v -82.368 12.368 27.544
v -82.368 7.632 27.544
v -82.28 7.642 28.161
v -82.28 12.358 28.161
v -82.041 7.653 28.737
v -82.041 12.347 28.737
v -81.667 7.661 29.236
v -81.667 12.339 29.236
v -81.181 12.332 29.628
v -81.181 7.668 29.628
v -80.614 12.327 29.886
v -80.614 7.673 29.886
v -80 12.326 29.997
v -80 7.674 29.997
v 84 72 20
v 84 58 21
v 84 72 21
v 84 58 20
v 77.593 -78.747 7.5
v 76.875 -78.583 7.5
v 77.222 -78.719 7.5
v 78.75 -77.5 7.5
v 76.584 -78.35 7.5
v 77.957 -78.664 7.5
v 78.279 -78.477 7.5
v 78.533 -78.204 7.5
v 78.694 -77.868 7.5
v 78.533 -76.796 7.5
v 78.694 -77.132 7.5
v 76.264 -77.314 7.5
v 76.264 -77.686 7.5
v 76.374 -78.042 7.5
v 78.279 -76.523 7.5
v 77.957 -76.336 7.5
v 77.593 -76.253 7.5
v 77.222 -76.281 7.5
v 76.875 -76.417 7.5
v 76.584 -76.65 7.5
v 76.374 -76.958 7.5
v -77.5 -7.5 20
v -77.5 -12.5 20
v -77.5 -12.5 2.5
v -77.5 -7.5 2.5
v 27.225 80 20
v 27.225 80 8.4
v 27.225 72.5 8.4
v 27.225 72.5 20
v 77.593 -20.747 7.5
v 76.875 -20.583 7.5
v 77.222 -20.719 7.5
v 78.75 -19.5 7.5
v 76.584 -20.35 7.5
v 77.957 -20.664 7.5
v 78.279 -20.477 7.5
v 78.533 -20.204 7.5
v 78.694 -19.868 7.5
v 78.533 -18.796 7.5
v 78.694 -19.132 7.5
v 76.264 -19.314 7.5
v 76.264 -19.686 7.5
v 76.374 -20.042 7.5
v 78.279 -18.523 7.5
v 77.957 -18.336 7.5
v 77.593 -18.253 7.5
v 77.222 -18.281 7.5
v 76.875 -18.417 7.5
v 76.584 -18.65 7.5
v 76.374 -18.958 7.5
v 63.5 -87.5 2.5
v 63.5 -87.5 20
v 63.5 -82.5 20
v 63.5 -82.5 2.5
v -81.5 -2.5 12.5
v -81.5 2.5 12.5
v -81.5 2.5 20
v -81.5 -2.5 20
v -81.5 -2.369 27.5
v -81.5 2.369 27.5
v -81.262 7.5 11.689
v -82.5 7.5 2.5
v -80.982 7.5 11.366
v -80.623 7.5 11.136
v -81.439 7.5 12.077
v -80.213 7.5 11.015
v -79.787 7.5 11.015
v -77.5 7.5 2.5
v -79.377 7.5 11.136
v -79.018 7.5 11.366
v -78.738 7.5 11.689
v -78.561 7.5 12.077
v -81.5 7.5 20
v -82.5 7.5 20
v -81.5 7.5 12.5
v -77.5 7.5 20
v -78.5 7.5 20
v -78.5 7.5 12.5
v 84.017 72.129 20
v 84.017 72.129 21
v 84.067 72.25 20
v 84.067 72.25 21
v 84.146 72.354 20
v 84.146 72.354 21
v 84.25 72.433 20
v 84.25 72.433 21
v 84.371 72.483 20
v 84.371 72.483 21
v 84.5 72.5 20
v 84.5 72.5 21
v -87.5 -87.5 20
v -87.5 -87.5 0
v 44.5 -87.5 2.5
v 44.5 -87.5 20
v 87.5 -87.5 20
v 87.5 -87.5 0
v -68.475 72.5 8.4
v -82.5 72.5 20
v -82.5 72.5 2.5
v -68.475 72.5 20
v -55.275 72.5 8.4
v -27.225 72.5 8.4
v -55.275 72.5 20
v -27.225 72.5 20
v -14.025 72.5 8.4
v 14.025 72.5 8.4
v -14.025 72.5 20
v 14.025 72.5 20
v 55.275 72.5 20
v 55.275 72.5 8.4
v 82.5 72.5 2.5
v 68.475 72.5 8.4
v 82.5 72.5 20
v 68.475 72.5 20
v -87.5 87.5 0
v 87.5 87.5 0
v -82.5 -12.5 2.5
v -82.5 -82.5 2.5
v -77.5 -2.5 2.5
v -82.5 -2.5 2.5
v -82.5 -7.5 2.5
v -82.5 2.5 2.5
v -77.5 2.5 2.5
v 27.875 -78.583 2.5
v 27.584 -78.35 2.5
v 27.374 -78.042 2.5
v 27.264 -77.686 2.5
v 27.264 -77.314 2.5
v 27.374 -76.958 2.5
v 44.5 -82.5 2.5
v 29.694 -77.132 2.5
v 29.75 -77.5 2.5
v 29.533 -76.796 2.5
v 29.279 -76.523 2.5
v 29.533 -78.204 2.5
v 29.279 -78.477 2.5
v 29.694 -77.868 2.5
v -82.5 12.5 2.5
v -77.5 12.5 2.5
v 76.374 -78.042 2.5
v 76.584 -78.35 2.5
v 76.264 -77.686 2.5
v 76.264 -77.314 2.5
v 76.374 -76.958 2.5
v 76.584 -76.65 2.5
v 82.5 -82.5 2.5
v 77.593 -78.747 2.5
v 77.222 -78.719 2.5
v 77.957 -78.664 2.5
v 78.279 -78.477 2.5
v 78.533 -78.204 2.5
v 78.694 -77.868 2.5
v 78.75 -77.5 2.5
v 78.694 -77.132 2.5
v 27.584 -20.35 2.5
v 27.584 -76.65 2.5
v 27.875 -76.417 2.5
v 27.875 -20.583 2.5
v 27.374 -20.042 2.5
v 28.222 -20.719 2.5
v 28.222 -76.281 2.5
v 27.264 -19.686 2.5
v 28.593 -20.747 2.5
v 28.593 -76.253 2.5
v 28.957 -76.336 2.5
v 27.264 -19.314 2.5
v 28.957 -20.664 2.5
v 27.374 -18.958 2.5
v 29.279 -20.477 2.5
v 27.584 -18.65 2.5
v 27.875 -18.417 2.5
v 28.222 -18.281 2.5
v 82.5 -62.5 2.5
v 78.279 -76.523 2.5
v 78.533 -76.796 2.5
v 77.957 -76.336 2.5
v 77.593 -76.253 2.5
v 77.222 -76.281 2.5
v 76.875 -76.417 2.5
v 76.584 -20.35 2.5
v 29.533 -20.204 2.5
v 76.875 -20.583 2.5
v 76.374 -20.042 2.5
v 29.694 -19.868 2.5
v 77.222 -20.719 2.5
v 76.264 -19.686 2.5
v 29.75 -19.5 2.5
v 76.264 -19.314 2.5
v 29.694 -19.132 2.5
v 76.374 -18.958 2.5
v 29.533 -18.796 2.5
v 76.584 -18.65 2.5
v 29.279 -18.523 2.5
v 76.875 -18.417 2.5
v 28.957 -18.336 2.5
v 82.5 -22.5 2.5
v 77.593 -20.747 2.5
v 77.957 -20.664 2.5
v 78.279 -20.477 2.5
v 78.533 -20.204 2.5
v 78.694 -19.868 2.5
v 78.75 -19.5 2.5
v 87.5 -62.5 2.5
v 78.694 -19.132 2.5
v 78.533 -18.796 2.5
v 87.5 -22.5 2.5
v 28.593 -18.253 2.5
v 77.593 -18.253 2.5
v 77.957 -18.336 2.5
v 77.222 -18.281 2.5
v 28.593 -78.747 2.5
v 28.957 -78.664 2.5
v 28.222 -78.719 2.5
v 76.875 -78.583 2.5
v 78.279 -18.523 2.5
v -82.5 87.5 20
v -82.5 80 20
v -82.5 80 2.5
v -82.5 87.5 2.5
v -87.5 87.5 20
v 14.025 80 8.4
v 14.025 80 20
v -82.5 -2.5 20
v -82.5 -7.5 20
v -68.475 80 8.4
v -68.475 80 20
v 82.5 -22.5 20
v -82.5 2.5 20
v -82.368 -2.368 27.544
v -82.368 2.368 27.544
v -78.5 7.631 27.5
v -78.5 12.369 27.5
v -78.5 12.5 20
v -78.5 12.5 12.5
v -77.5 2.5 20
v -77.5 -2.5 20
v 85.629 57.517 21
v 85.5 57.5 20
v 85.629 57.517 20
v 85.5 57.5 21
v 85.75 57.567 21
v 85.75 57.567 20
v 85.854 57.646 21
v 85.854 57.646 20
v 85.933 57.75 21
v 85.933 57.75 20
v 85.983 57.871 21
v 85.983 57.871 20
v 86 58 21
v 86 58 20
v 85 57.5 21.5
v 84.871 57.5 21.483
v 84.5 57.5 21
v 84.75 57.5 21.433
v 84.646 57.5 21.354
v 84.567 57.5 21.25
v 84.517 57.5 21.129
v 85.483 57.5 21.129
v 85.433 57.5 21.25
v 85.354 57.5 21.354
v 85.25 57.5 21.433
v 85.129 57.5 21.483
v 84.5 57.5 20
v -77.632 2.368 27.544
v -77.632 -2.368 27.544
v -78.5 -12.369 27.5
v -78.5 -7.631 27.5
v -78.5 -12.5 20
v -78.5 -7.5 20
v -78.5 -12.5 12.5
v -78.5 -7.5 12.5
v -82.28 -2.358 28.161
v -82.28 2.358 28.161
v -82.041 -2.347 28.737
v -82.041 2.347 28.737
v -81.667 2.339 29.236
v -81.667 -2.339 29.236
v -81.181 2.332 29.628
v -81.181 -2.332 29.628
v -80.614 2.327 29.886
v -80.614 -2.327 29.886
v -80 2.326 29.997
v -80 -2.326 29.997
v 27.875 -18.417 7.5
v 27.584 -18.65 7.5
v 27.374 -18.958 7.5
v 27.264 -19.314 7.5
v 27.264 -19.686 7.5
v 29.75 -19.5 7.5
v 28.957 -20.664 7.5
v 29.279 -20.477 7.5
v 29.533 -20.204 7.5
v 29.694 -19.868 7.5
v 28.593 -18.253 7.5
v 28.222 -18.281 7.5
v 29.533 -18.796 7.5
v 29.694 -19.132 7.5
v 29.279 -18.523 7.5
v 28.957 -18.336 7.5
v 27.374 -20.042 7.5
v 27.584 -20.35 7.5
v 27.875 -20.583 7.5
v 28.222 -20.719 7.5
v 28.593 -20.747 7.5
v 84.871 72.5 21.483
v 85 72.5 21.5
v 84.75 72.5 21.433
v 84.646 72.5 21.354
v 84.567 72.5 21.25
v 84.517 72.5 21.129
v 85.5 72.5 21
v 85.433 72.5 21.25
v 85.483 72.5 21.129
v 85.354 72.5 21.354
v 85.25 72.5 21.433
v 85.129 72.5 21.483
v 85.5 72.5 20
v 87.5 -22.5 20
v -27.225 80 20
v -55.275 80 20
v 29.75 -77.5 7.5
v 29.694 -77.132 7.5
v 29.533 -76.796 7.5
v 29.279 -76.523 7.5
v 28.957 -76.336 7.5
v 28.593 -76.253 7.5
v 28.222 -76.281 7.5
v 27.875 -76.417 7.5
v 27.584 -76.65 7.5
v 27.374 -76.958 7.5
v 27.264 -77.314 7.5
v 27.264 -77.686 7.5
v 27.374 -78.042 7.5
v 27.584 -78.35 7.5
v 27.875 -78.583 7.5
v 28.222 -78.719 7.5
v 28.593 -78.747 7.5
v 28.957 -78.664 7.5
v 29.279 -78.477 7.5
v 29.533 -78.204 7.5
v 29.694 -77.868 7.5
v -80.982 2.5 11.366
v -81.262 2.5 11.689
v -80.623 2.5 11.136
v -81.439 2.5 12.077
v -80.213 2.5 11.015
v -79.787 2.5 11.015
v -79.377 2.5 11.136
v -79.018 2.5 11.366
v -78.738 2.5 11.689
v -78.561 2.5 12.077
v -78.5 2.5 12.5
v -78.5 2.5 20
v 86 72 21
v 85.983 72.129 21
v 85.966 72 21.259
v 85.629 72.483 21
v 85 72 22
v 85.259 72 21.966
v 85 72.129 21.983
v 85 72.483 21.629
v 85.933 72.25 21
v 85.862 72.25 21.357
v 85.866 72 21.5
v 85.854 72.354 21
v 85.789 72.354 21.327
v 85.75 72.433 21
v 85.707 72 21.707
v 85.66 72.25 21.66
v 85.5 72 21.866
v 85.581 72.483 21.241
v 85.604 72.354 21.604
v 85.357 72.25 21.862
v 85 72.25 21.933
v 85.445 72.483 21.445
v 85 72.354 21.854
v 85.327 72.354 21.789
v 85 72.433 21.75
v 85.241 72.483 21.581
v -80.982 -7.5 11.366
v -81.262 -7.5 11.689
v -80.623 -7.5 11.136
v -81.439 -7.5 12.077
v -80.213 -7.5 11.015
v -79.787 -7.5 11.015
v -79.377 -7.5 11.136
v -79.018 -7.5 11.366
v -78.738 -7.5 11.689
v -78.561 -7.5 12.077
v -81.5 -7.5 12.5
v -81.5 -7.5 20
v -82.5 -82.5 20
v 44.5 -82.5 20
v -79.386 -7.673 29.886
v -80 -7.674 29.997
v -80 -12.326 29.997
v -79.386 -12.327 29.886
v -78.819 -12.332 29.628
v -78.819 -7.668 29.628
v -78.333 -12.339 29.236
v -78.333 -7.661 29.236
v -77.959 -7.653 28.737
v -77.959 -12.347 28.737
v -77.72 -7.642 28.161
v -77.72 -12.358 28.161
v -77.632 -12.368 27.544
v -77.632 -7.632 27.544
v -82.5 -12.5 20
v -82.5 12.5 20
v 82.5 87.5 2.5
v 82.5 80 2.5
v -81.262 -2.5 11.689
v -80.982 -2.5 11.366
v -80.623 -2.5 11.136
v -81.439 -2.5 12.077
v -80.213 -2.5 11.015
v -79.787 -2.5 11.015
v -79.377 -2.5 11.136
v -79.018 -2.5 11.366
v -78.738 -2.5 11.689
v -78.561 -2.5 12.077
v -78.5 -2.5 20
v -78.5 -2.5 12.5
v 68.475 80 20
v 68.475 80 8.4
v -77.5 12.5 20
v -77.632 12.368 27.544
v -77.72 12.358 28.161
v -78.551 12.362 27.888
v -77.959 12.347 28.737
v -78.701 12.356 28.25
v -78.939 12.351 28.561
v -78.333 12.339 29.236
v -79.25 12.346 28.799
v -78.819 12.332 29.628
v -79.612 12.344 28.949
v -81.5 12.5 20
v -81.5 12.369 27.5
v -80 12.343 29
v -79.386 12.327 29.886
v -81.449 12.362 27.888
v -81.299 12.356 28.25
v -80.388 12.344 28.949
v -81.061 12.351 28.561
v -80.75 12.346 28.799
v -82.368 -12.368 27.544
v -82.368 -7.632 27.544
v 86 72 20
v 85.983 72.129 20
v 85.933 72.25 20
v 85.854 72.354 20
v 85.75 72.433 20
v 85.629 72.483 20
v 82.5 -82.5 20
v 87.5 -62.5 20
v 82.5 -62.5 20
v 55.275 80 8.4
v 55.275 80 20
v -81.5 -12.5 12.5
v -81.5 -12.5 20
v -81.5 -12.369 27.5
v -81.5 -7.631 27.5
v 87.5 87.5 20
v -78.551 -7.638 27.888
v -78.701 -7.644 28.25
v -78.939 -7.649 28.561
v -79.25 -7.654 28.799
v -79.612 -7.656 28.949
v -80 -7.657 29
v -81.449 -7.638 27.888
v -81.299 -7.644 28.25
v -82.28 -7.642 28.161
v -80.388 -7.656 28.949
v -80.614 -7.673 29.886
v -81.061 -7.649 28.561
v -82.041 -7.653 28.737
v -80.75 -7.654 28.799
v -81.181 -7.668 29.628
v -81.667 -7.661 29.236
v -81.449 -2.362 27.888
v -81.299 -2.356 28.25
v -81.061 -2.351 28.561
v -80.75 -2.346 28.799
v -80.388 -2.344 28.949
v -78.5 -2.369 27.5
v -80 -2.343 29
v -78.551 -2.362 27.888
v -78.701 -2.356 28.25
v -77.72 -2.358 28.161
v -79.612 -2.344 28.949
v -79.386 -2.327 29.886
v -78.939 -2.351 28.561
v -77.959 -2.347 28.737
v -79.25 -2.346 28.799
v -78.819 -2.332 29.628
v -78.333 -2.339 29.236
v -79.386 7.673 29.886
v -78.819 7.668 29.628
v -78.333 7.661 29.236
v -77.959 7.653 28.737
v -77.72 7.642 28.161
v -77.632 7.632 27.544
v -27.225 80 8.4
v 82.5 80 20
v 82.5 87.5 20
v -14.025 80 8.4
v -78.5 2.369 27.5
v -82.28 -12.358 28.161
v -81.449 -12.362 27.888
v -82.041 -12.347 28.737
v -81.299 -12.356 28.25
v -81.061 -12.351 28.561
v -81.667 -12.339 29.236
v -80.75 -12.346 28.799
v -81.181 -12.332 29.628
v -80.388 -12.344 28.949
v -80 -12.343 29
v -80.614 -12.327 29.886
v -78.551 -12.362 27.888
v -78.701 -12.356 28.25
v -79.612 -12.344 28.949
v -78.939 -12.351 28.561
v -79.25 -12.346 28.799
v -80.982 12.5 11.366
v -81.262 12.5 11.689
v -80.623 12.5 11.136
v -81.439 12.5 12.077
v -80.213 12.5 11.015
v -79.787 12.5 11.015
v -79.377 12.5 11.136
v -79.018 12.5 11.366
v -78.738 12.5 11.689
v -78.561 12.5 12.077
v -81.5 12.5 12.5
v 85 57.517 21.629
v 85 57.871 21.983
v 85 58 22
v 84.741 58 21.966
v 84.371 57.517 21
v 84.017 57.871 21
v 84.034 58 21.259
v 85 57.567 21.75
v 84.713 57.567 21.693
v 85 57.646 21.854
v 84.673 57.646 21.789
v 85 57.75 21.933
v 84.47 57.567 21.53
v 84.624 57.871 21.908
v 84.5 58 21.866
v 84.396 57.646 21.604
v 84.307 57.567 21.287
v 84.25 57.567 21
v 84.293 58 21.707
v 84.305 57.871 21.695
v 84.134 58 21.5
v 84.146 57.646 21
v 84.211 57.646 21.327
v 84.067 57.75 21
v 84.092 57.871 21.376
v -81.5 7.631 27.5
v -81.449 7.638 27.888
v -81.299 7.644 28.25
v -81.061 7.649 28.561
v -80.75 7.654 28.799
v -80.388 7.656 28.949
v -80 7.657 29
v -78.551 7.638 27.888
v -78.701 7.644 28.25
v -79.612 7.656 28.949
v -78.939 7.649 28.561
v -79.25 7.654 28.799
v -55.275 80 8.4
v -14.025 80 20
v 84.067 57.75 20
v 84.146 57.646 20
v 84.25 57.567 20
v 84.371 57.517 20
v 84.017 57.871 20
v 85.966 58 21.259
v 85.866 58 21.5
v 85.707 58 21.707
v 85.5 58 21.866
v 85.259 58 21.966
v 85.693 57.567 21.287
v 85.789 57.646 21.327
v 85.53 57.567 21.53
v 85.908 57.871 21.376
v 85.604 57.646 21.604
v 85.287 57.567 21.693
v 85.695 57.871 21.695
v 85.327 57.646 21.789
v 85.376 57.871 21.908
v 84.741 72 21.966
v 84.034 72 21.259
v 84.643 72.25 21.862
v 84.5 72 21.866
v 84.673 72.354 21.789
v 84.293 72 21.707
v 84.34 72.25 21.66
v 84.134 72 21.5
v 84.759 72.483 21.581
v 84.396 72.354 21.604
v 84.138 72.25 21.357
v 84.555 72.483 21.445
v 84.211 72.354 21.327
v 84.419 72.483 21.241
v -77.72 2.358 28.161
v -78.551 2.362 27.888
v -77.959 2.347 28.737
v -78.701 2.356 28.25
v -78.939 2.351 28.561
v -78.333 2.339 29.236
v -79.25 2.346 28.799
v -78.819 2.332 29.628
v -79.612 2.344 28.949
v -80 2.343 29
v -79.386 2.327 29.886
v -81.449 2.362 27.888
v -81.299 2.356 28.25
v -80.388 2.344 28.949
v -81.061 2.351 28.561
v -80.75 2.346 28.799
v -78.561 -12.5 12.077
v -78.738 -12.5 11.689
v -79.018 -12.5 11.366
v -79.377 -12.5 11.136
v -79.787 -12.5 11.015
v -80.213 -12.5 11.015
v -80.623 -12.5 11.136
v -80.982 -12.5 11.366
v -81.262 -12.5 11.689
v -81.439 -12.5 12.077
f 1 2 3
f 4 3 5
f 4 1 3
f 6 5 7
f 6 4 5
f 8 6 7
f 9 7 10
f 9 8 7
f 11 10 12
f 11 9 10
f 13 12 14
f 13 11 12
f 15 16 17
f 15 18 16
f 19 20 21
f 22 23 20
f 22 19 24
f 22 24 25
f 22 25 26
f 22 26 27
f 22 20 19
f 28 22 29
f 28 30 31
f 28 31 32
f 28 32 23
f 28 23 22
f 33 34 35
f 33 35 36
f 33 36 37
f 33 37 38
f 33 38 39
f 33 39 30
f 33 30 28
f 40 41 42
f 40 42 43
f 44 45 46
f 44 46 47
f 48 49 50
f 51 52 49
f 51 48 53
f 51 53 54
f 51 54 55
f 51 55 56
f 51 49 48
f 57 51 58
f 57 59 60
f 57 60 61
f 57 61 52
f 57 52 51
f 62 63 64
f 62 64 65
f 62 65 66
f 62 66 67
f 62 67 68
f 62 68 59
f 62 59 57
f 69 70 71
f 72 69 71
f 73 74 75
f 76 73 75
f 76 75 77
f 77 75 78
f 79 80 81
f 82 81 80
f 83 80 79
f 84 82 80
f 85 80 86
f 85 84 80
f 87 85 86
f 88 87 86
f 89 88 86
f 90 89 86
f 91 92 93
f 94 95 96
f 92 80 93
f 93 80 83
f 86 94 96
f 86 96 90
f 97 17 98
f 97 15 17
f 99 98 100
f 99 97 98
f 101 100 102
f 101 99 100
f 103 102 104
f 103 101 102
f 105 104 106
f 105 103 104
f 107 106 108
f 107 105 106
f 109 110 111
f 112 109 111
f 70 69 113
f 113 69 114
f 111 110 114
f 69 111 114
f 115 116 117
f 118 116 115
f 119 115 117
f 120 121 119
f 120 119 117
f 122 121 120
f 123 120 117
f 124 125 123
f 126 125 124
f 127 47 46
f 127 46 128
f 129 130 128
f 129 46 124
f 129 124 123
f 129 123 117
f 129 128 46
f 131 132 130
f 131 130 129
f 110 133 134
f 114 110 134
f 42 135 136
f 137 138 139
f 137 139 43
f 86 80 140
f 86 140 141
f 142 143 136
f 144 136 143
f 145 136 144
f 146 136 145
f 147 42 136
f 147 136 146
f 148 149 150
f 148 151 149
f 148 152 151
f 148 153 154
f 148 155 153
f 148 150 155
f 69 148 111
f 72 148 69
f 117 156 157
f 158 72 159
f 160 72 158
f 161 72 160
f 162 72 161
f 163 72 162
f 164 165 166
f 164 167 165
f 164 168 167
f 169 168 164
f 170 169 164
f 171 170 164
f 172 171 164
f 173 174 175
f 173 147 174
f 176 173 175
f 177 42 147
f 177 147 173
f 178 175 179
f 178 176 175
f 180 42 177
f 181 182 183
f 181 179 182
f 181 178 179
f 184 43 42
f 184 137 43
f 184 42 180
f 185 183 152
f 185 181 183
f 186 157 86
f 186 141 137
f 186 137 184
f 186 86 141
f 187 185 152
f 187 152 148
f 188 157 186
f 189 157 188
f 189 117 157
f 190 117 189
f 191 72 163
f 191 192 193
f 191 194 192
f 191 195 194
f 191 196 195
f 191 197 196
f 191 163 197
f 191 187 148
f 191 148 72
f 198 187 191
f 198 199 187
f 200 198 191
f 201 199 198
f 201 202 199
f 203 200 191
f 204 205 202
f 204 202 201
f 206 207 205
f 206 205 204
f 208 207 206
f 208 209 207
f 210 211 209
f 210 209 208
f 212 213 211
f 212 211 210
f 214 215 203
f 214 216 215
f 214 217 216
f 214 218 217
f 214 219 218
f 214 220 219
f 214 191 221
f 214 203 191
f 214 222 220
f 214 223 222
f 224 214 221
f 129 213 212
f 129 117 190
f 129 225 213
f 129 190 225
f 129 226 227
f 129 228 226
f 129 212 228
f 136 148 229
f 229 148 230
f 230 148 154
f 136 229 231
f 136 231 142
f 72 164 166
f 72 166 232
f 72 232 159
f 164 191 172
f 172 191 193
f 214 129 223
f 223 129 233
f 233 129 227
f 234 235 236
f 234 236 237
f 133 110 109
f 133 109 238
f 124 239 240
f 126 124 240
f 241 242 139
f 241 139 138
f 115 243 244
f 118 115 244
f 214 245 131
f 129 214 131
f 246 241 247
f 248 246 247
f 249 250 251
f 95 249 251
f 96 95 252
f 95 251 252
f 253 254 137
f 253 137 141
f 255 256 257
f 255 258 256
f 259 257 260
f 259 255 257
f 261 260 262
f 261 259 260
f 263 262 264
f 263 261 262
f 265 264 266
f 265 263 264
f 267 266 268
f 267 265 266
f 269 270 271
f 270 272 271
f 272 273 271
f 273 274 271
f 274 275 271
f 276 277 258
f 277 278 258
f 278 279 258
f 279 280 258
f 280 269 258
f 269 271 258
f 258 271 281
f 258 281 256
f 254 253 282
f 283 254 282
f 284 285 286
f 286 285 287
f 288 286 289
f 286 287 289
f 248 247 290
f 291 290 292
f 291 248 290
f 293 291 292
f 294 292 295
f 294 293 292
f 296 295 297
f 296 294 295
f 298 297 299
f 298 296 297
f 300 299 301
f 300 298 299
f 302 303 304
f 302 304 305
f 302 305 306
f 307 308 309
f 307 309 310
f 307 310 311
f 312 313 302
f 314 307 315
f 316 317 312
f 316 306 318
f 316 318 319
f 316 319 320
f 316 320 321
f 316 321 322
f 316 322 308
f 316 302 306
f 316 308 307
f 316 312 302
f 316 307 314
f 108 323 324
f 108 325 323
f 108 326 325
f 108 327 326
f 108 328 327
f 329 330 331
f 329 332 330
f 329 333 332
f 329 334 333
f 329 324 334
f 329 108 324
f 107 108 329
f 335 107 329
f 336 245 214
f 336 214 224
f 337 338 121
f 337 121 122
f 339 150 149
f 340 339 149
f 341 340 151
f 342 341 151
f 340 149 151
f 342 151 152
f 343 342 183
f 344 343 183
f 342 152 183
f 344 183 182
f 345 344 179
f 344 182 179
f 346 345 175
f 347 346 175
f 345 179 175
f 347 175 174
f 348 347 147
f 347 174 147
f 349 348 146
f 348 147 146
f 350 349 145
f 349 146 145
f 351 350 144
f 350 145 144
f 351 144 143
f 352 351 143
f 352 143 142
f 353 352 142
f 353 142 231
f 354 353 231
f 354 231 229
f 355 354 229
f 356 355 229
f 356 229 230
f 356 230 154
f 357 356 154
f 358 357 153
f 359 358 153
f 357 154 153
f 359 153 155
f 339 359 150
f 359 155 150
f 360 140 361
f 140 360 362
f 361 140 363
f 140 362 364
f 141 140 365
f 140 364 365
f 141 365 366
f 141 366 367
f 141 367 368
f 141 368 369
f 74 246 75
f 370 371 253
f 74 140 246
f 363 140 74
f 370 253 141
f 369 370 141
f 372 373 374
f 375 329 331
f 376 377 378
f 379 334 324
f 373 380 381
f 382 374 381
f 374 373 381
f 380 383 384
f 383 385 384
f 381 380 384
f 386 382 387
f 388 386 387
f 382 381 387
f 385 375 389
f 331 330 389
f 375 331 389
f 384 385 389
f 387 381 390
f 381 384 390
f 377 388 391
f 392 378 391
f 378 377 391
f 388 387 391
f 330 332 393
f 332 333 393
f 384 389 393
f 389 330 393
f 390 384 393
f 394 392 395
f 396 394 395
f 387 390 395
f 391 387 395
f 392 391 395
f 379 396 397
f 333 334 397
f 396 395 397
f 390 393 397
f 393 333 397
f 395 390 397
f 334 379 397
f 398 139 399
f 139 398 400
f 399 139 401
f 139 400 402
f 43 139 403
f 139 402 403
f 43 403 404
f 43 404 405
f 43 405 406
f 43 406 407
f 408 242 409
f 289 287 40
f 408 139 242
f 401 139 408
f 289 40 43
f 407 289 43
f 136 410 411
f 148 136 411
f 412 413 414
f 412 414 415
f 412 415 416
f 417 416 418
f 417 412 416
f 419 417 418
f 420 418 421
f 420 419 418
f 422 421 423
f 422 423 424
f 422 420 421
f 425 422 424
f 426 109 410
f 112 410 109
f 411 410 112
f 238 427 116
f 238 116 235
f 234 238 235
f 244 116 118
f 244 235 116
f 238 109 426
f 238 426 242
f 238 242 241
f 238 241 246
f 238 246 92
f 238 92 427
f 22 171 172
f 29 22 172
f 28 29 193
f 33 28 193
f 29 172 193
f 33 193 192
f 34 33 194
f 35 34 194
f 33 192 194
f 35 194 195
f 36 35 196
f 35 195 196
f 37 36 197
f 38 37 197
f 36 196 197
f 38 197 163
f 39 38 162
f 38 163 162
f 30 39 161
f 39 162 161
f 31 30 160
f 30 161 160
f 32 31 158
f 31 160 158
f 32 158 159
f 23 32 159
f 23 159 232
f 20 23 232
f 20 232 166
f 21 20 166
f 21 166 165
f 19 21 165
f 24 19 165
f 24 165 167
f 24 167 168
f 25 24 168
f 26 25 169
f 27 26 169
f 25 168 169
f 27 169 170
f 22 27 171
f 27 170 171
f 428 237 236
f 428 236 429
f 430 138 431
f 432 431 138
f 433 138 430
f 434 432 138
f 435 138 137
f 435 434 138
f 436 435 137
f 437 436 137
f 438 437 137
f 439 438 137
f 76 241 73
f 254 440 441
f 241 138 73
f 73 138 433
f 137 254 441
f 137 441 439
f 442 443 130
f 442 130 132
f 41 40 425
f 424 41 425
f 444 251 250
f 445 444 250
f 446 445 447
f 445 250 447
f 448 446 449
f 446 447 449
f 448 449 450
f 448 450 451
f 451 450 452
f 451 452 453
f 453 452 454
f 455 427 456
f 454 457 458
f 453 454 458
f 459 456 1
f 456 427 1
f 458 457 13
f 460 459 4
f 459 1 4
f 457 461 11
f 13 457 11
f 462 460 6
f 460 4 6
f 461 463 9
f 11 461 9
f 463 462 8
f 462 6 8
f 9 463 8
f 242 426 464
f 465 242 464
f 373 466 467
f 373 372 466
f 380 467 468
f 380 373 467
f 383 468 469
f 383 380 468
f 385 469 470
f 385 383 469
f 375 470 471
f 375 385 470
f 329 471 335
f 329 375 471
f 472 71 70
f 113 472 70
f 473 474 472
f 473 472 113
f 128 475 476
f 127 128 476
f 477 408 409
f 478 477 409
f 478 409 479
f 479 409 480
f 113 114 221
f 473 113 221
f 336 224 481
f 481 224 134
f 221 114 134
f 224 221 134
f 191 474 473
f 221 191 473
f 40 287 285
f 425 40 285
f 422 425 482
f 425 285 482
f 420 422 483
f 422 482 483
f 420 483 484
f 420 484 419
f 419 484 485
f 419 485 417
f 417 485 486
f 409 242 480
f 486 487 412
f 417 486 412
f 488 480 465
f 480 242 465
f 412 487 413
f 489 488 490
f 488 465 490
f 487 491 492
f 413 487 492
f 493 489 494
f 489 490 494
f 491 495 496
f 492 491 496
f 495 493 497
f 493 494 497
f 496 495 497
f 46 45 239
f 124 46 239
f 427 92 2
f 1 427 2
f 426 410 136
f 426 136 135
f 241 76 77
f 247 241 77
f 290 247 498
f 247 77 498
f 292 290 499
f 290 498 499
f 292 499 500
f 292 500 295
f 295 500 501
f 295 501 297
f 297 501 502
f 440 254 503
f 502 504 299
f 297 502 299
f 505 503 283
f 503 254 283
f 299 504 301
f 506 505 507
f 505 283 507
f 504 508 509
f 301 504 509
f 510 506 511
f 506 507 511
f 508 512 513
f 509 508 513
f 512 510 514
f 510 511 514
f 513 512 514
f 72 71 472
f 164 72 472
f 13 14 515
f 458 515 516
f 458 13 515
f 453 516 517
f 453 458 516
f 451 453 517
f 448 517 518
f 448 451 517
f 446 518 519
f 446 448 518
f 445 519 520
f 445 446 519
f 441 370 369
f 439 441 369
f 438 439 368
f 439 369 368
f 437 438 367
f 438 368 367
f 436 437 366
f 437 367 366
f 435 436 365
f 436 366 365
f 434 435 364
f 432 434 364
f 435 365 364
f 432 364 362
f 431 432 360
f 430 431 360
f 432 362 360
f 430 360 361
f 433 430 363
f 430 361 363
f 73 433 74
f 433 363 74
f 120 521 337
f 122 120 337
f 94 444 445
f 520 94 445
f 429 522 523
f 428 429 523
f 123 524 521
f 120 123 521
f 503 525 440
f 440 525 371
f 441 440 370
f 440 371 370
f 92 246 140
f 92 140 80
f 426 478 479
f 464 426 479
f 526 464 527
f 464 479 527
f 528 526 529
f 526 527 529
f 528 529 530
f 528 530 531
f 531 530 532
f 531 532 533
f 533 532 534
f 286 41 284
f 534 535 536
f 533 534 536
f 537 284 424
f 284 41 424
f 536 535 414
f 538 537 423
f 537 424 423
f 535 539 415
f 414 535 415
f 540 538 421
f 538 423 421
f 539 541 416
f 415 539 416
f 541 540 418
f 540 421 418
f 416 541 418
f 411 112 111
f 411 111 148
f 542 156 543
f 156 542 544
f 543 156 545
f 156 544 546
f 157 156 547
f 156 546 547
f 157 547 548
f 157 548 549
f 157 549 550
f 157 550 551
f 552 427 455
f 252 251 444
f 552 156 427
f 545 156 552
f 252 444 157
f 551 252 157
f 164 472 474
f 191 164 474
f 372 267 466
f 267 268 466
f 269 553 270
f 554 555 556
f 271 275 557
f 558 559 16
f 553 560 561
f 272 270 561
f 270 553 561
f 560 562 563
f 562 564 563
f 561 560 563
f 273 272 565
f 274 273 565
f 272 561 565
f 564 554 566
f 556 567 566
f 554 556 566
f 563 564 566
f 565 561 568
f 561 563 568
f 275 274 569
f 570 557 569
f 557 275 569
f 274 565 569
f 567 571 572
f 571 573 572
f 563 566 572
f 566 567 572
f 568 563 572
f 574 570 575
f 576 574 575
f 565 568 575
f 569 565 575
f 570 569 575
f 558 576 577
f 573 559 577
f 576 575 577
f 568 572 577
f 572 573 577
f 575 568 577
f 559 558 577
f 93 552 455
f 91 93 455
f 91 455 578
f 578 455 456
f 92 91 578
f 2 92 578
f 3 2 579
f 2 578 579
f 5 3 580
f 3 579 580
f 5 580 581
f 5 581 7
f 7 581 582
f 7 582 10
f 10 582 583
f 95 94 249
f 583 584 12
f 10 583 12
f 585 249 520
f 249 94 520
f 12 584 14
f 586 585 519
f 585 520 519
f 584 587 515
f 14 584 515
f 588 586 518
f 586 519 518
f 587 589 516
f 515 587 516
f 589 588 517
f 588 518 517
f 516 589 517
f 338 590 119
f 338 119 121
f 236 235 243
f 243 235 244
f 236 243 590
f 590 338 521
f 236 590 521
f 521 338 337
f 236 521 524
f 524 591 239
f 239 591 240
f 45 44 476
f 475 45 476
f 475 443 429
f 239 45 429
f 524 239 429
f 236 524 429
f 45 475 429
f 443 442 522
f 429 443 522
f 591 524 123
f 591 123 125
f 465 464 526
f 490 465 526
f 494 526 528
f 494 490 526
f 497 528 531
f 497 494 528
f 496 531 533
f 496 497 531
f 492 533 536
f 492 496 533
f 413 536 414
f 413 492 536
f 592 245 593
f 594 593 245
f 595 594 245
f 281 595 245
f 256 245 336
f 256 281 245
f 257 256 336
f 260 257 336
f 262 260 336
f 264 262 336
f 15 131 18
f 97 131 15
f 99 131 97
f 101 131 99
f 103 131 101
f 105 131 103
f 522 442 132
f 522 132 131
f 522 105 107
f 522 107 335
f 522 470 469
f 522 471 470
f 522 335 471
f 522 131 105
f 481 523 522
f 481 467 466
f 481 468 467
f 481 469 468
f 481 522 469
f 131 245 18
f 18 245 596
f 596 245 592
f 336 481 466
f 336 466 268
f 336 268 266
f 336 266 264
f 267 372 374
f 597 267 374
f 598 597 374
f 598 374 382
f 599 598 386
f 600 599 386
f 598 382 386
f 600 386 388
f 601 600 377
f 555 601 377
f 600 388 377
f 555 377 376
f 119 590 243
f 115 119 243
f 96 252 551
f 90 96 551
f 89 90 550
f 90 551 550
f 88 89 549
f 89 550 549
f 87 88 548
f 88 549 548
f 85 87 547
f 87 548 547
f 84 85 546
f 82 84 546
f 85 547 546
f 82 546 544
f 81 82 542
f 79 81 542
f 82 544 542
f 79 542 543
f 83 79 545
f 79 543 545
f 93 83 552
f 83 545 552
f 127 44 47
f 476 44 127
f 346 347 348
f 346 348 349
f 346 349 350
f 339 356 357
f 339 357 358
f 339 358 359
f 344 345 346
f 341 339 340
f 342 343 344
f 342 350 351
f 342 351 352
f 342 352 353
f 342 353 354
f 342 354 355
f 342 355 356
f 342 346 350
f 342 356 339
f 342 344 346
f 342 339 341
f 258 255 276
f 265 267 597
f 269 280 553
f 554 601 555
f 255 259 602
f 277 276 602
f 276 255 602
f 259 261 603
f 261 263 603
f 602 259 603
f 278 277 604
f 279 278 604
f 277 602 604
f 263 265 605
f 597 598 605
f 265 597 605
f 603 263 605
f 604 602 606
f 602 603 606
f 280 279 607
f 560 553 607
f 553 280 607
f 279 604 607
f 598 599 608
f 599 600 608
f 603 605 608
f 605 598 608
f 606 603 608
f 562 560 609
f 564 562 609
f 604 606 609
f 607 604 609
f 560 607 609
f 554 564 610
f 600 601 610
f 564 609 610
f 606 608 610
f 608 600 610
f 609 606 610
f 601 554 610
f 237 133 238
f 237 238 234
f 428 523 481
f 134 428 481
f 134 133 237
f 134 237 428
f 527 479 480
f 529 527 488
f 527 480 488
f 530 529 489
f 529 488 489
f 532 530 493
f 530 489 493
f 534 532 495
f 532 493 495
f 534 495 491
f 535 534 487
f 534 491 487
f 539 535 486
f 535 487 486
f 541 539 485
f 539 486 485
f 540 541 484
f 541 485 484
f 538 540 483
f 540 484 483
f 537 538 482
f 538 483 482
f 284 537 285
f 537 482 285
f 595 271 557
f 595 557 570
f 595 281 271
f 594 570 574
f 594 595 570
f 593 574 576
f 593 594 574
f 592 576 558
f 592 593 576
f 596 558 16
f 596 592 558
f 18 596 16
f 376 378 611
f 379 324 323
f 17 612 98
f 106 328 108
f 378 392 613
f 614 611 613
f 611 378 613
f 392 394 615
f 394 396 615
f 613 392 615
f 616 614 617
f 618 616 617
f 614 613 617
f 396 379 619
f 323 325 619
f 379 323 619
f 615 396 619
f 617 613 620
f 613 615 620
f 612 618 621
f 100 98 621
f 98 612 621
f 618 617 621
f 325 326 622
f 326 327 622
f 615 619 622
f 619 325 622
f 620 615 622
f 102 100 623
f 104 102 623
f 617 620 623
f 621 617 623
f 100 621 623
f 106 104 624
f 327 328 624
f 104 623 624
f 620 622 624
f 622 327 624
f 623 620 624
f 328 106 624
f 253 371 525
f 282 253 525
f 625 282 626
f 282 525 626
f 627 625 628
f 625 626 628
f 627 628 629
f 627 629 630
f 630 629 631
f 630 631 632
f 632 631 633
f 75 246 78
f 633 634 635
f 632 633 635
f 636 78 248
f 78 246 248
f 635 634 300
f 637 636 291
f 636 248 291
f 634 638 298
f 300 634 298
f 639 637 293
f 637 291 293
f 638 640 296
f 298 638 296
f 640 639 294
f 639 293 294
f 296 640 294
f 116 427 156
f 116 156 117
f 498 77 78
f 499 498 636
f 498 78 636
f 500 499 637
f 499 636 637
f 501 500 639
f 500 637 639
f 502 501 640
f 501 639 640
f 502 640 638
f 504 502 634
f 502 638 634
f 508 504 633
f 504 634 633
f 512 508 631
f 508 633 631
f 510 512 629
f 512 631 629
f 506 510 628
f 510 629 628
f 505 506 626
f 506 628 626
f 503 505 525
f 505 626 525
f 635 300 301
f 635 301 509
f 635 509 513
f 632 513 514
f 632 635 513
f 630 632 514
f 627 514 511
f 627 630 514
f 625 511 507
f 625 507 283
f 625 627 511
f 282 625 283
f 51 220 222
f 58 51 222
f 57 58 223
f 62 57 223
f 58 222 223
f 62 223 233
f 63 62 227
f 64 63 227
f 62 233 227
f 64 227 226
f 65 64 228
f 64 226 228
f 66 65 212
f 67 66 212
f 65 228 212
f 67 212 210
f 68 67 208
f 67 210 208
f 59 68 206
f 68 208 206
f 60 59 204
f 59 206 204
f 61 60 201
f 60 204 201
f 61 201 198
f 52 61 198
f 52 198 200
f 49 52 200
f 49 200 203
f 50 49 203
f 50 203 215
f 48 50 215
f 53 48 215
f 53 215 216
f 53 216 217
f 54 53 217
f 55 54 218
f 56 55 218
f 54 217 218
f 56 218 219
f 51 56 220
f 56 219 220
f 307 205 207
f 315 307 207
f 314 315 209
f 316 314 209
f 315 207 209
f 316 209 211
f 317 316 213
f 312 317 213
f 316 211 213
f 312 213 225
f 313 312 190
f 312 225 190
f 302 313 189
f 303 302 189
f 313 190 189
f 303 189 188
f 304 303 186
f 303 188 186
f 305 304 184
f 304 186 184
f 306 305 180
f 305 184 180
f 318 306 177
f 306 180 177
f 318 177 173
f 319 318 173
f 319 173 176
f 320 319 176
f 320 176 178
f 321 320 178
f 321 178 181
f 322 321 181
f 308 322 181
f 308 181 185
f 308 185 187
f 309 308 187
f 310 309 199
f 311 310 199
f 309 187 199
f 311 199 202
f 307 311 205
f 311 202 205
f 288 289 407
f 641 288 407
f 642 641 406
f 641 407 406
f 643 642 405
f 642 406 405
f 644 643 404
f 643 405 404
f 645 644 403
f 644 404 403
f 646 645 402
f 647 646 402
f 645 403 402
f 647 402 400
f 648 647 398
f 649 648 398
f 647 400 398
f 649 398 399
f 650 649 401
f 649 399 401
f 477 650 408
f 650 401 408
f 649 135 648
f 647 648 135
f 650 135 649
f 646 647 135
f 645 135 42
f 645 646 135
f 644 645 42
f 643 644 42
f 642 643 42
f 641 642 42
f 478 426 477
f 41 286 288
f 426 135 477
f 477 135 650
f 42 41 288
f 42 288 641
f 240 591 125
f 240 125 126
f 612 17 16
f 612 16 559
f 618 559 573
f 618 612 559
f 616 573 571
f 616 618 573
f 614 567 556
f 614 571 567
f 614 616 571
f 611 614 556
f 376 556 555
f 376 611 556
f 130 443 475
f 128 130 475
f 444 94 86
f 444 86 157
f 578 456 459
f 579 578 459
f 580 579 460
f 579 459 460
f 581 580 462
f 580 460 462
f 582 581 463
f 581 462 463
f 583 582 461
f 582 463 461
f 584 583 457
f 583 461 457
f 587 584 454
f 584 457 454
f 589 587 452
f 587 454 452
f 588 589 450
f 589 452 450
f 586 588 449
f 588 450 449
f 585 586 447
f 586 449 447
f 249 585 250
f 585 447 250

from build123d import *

# Parameters (mm, degrees)
F0_W           = 175
F0_H           = 175
F1_DEPTH       = 20
F2_W           = 165
F2_H           = 155
F3_DEPTH       = 17.5
F4_R           = 1.25
F5_DEPTH       = 5
F6_W           = 165
F6_H           = 7.5
F7_DEPTH       = 17.5
F8_W           = 13.2
F8_H           = 5.7
F9_DEPTH       = 8.5
F10_W          = 5
F10_H          = 5
F11_DEPTH      = 17.5
F11_DEPTH_BACK = 10
F11_TAPER_BACK = 1
F12_T1_DEPTH   = 16.9346144904
F12_T3_DEPTH   = 16.9346144904
F12_T5_DEPTH   = 16.9346144904
F14_DEPTH      = 25
F15_W          = 19
F15_H          = 17.6808023453
F15_W_2        = 32.2772479057
F15_H_2        = 40
F16_DEPTH      = 17.5
F17_W          = 13.2
F17_H          = 5.9
F18_DEPTH      = 8.5
F19_W          = 2
F19_H          = 15
F20_DEPTH      = 2
F21_R          = 0.99999
F22_R          = 0.5


# Not quite as in the source:
# - a fillet or chamfer that OpenCascade refuses, or shapes differently, is made with other operations: its cross-section is extruded or revolved along the edge and cut away or added
# - a fillet or chamfer is up to 0.001 mm smaller than in the source, because OpenCascade refuses the exact size


with BuildPart() as f1:
    # F0 (on Top) → F1 (new body)
    with BuildSketch(Plane.XY):
        Rectangle(F0_W, F0_H)
    extrude(amount=F1_DEPTH)

    # F2 (on face) → F3 (cut)
    with BuildSketch(Plane.XY.offset(20)):
        with Locations((0, -5)):
            Rectangle(F2_W, F2_H)
    extrude(amount=-F3_DEPTH, mode=Mode.SUBTRACT)

    # F4 (on face) → F5 (join)
    with BuildSketch(Plane.XY.offset(2.5)):
        with Locations((28.5, -77.5)):
            Circle(F4_R)
        with Locations((28.5, -19.5)):
            Circle(F4_R)
        with Locations((77.5, -77.5)):
            Circle(F4_R)
        with Locations((77.5, -19.5)):
            Circle(F4_R)
    extrude(amount=F5_DEPTH)

    # F6 (on face) → F7 (cut)
    with BuildSketch(Plane.XY.offset(20)):
        with Locations((0, 83.75)):
            Rectangle(F6_W, F6_H)
    extrude(amount=-F7_DEPTH, mode=Mode.SUBTRACT)

    # F8 (on face) → F9 (cut)
    with BuildSketch(Plane(origin=(0, 80, 0), x_dir=(-1, 0, 0), z_dir=(0, 1, 0))):
        with Locations((-61.875, 11.25)):
            Rectangle(F8_W, F8_H)
        with Locations((-20.625, 11.25)):
            Rectangle(F8_W, F8_H)
        with Locations((20.625, 11.25)):
            Rectangle(F8_W, F8_H)
        with Locations((61.875, 11.25)):
            Rectangle(F8_W, F8_H)
    extrude(amount=-F9_DEPTH, mode=Mode.SUBTRACT)

    # F10 (on face) → F11 (join, two sides)
    with BuildSketch(Plane.XY.offset(20)) as f11_sk:
        with Locations((-80, 0)):
            Rectangle(F10_W, F10_H)
        with Locations((-80, 10)):
            Rectangle(F10_W, F10_H)
        with Locations((-80, -10)):
            Rectangle(F10_W, F10_H)
    extrude(amount=-F11_DEPTH)
    extrude(f11_sk.sketch, amount=F11_DEPTH_BACK, taper=F11_TAPER_BACK)

    # F12: fillet of radius 2.5 on 6 edges, made by hand

    # F12_s2 → F12_t1 (cut)
    with BuildSketch(Plane.XZ.offset(-18.4673072452)):
        with BuildLine():
            ThreePointArc((-82.3683254308, 27.5436310161), (-81.6209793537, 29.2831261229), (-79.8687061929, 30))
            Line((-79.8687061929, 30), (-82.3254493507, 30))
            Line((-82.3254493507, 30), (-82.3683254308, 27.5436310161))
        make_face()
        with BuildLine():
            ThreePointArc((-80.1312938071, 30), (-78.3790206463, 29.2831261229), (-77.6316745692, 27.5436310161))
            Line((-77.6316745692, 27.5436310161), (-77.6745506493, 30))
            Line((-77.6745506493, 30), (-80.1312938071, 30))
        make_face()
    extrude(amount=F12_T1_DEPTH, mode=Mode.SUBTRACT)

    # F12_s4 → F12_t3 (cut)
    with BuildSketch(Plane.XZ.offset(-8.4673072452)):
        with BuildLine():
            ThreePointArc((-82.3683254308, 27.5436310161), (-81.6209793537, 29.2831261229), (-79.8687061929, 30))
            Line((-79.8687061929, 30), (-82.3254493507, 30))
            Line((-82.3254493507, 30), (-82.3683254308, 27.5436310161))
        make_face()
        with BuildLine():
            ThreePointArc((-80.1312938071, 30), (-78.3790206463, 29.2831261229), (-77.6316745692, 27.5436310161))
            Line((-77.6316745692, 27.5436310161), (-77.6745506493, 30))
            Line((-77.6745506493, 30), (-80.1312938071, 30))
        make_face()
    extrude(amount=F12_T3_DEPTH, mode=Mode.SUBTRACT)

    # F12_s6 → F12_t5 (cut)
    with BuildSketch(Plane.XZ.offset(1.5326927548)):
        with BuildLine():
            ThreePointArc((-82.3683254308, 27.5436310161), (-81.6209793537, 29.2831261229), (-79.8687061929, 30))
            Line((-79.8687061929, 30), (-82.3254493507, 30))
            Line((-82.3254493507, 30), (-82.3683254308, 27.5436310161))
        make_face()
        with BuildLine():
            ThreePointArc((-80.1312938071, 30), (-78.3790206463, 29.2831261229), (-77.6316745692, 27.5436310161))
            Line((-77.6316745692, 27.5436310161), (-77.6745506493, 30))
            Line((-77.6745506493, 30), (-80.1312938071, 30))
        make_face()
    extrude(amount=F12_T5_DEPTH, mode=Mode.SUBTRACT)

    # F13 (on face) → F14 (cut)
    with BuildSketch(Plane(origin=(0, 12.5, 0), x_dir=(-1, 0, 0), z_dir=(0, 1, 0))):
        with BuildLine():
            Line((81.5, 12.5), (81.5, 27.5))
            ThreePointArc((81.5, 27.5), (80, 29), (78.5, 27.5))
            Line((78.5, 27.5), (78.5, 12.5))
            ThreePointArc((78.5, 12.5), (80, 11), (81.5, 12.5))
        make_face()
    extrude(amount=-F14_DEPTH, mode=Mode.SUBTRACT)

    # F15 (on face) → F16 (cut)
    with BuildSketch(Plane.XY.offset(20)):
        with Locations((54, -82.5)):
            Rectangle(F15_W, F15_H)
        with Locations((82.5, -42.5)):
            Rectangle(F15_W_2, F15_H_2)
    extrude(amount=-F16_DEPTH, mode=Mode.SUBTRACT)

    # F17 (on face) → F18 (cut)
    with BuildSketch(Plane(origin=(0, 80, 0), x_dir=(-1, 0, 0), z_dir=(0, 1, 0))):
        with Locations((-61.875, 17.05)):
            Rectangle(F17_W, F17_H)
        with Locations((-20.625, 17.05)):
            Rectangle(F17_W, F17_H)
        with Locations((20.625, 17.05)):
            Rectangle(F17_W, F17_H)
        with Locations((61.875, 17.05)):
            Rectangle(F17_W, F17_H)
    extrude(amount=-F18_DEPTH, mode=Mode.SUBTRACT)

    # F19 (on face) → F20 (join)
    with BuildSketch(Plane.XY.offset(20)):
        with Locations((85, 65)):
            Rectangle(F19_W, F19_H)
    extrude(amount=F20_DEPTH)

    # F21 (radius 1 in the source; OpenCascade refuses exactly that, so slightly less here)
    f21_edges = [f1.edges().sort_by_distance(p)[0] for p in [
        (84, 65, 22),
        (86, 65, 22),
    ]]
    fillet(f21_edges, radius=F21_R)

    # F22
    f22_edges = [f1.edges().sort_by_distance(p)[0] for p in [
        (85.70711, 57.5, 21.70711),
        (85.70711, 72.5, 21.70711),
        (86, 57.5, 20.500005),
        (86, 72.5, 20.500005),
        (84, 57.5, 20.500005),
        (84.29289, 57.5, 21.70711),
        (85, 57.5, 22),
        (85, 72.5, 22),
        (84, 72.5, 20.500005),
        (84.29289, 72.5, 21.70711),
    ]]
    fillet(f22_edges, radius=F22_R)


solid = f1.part
